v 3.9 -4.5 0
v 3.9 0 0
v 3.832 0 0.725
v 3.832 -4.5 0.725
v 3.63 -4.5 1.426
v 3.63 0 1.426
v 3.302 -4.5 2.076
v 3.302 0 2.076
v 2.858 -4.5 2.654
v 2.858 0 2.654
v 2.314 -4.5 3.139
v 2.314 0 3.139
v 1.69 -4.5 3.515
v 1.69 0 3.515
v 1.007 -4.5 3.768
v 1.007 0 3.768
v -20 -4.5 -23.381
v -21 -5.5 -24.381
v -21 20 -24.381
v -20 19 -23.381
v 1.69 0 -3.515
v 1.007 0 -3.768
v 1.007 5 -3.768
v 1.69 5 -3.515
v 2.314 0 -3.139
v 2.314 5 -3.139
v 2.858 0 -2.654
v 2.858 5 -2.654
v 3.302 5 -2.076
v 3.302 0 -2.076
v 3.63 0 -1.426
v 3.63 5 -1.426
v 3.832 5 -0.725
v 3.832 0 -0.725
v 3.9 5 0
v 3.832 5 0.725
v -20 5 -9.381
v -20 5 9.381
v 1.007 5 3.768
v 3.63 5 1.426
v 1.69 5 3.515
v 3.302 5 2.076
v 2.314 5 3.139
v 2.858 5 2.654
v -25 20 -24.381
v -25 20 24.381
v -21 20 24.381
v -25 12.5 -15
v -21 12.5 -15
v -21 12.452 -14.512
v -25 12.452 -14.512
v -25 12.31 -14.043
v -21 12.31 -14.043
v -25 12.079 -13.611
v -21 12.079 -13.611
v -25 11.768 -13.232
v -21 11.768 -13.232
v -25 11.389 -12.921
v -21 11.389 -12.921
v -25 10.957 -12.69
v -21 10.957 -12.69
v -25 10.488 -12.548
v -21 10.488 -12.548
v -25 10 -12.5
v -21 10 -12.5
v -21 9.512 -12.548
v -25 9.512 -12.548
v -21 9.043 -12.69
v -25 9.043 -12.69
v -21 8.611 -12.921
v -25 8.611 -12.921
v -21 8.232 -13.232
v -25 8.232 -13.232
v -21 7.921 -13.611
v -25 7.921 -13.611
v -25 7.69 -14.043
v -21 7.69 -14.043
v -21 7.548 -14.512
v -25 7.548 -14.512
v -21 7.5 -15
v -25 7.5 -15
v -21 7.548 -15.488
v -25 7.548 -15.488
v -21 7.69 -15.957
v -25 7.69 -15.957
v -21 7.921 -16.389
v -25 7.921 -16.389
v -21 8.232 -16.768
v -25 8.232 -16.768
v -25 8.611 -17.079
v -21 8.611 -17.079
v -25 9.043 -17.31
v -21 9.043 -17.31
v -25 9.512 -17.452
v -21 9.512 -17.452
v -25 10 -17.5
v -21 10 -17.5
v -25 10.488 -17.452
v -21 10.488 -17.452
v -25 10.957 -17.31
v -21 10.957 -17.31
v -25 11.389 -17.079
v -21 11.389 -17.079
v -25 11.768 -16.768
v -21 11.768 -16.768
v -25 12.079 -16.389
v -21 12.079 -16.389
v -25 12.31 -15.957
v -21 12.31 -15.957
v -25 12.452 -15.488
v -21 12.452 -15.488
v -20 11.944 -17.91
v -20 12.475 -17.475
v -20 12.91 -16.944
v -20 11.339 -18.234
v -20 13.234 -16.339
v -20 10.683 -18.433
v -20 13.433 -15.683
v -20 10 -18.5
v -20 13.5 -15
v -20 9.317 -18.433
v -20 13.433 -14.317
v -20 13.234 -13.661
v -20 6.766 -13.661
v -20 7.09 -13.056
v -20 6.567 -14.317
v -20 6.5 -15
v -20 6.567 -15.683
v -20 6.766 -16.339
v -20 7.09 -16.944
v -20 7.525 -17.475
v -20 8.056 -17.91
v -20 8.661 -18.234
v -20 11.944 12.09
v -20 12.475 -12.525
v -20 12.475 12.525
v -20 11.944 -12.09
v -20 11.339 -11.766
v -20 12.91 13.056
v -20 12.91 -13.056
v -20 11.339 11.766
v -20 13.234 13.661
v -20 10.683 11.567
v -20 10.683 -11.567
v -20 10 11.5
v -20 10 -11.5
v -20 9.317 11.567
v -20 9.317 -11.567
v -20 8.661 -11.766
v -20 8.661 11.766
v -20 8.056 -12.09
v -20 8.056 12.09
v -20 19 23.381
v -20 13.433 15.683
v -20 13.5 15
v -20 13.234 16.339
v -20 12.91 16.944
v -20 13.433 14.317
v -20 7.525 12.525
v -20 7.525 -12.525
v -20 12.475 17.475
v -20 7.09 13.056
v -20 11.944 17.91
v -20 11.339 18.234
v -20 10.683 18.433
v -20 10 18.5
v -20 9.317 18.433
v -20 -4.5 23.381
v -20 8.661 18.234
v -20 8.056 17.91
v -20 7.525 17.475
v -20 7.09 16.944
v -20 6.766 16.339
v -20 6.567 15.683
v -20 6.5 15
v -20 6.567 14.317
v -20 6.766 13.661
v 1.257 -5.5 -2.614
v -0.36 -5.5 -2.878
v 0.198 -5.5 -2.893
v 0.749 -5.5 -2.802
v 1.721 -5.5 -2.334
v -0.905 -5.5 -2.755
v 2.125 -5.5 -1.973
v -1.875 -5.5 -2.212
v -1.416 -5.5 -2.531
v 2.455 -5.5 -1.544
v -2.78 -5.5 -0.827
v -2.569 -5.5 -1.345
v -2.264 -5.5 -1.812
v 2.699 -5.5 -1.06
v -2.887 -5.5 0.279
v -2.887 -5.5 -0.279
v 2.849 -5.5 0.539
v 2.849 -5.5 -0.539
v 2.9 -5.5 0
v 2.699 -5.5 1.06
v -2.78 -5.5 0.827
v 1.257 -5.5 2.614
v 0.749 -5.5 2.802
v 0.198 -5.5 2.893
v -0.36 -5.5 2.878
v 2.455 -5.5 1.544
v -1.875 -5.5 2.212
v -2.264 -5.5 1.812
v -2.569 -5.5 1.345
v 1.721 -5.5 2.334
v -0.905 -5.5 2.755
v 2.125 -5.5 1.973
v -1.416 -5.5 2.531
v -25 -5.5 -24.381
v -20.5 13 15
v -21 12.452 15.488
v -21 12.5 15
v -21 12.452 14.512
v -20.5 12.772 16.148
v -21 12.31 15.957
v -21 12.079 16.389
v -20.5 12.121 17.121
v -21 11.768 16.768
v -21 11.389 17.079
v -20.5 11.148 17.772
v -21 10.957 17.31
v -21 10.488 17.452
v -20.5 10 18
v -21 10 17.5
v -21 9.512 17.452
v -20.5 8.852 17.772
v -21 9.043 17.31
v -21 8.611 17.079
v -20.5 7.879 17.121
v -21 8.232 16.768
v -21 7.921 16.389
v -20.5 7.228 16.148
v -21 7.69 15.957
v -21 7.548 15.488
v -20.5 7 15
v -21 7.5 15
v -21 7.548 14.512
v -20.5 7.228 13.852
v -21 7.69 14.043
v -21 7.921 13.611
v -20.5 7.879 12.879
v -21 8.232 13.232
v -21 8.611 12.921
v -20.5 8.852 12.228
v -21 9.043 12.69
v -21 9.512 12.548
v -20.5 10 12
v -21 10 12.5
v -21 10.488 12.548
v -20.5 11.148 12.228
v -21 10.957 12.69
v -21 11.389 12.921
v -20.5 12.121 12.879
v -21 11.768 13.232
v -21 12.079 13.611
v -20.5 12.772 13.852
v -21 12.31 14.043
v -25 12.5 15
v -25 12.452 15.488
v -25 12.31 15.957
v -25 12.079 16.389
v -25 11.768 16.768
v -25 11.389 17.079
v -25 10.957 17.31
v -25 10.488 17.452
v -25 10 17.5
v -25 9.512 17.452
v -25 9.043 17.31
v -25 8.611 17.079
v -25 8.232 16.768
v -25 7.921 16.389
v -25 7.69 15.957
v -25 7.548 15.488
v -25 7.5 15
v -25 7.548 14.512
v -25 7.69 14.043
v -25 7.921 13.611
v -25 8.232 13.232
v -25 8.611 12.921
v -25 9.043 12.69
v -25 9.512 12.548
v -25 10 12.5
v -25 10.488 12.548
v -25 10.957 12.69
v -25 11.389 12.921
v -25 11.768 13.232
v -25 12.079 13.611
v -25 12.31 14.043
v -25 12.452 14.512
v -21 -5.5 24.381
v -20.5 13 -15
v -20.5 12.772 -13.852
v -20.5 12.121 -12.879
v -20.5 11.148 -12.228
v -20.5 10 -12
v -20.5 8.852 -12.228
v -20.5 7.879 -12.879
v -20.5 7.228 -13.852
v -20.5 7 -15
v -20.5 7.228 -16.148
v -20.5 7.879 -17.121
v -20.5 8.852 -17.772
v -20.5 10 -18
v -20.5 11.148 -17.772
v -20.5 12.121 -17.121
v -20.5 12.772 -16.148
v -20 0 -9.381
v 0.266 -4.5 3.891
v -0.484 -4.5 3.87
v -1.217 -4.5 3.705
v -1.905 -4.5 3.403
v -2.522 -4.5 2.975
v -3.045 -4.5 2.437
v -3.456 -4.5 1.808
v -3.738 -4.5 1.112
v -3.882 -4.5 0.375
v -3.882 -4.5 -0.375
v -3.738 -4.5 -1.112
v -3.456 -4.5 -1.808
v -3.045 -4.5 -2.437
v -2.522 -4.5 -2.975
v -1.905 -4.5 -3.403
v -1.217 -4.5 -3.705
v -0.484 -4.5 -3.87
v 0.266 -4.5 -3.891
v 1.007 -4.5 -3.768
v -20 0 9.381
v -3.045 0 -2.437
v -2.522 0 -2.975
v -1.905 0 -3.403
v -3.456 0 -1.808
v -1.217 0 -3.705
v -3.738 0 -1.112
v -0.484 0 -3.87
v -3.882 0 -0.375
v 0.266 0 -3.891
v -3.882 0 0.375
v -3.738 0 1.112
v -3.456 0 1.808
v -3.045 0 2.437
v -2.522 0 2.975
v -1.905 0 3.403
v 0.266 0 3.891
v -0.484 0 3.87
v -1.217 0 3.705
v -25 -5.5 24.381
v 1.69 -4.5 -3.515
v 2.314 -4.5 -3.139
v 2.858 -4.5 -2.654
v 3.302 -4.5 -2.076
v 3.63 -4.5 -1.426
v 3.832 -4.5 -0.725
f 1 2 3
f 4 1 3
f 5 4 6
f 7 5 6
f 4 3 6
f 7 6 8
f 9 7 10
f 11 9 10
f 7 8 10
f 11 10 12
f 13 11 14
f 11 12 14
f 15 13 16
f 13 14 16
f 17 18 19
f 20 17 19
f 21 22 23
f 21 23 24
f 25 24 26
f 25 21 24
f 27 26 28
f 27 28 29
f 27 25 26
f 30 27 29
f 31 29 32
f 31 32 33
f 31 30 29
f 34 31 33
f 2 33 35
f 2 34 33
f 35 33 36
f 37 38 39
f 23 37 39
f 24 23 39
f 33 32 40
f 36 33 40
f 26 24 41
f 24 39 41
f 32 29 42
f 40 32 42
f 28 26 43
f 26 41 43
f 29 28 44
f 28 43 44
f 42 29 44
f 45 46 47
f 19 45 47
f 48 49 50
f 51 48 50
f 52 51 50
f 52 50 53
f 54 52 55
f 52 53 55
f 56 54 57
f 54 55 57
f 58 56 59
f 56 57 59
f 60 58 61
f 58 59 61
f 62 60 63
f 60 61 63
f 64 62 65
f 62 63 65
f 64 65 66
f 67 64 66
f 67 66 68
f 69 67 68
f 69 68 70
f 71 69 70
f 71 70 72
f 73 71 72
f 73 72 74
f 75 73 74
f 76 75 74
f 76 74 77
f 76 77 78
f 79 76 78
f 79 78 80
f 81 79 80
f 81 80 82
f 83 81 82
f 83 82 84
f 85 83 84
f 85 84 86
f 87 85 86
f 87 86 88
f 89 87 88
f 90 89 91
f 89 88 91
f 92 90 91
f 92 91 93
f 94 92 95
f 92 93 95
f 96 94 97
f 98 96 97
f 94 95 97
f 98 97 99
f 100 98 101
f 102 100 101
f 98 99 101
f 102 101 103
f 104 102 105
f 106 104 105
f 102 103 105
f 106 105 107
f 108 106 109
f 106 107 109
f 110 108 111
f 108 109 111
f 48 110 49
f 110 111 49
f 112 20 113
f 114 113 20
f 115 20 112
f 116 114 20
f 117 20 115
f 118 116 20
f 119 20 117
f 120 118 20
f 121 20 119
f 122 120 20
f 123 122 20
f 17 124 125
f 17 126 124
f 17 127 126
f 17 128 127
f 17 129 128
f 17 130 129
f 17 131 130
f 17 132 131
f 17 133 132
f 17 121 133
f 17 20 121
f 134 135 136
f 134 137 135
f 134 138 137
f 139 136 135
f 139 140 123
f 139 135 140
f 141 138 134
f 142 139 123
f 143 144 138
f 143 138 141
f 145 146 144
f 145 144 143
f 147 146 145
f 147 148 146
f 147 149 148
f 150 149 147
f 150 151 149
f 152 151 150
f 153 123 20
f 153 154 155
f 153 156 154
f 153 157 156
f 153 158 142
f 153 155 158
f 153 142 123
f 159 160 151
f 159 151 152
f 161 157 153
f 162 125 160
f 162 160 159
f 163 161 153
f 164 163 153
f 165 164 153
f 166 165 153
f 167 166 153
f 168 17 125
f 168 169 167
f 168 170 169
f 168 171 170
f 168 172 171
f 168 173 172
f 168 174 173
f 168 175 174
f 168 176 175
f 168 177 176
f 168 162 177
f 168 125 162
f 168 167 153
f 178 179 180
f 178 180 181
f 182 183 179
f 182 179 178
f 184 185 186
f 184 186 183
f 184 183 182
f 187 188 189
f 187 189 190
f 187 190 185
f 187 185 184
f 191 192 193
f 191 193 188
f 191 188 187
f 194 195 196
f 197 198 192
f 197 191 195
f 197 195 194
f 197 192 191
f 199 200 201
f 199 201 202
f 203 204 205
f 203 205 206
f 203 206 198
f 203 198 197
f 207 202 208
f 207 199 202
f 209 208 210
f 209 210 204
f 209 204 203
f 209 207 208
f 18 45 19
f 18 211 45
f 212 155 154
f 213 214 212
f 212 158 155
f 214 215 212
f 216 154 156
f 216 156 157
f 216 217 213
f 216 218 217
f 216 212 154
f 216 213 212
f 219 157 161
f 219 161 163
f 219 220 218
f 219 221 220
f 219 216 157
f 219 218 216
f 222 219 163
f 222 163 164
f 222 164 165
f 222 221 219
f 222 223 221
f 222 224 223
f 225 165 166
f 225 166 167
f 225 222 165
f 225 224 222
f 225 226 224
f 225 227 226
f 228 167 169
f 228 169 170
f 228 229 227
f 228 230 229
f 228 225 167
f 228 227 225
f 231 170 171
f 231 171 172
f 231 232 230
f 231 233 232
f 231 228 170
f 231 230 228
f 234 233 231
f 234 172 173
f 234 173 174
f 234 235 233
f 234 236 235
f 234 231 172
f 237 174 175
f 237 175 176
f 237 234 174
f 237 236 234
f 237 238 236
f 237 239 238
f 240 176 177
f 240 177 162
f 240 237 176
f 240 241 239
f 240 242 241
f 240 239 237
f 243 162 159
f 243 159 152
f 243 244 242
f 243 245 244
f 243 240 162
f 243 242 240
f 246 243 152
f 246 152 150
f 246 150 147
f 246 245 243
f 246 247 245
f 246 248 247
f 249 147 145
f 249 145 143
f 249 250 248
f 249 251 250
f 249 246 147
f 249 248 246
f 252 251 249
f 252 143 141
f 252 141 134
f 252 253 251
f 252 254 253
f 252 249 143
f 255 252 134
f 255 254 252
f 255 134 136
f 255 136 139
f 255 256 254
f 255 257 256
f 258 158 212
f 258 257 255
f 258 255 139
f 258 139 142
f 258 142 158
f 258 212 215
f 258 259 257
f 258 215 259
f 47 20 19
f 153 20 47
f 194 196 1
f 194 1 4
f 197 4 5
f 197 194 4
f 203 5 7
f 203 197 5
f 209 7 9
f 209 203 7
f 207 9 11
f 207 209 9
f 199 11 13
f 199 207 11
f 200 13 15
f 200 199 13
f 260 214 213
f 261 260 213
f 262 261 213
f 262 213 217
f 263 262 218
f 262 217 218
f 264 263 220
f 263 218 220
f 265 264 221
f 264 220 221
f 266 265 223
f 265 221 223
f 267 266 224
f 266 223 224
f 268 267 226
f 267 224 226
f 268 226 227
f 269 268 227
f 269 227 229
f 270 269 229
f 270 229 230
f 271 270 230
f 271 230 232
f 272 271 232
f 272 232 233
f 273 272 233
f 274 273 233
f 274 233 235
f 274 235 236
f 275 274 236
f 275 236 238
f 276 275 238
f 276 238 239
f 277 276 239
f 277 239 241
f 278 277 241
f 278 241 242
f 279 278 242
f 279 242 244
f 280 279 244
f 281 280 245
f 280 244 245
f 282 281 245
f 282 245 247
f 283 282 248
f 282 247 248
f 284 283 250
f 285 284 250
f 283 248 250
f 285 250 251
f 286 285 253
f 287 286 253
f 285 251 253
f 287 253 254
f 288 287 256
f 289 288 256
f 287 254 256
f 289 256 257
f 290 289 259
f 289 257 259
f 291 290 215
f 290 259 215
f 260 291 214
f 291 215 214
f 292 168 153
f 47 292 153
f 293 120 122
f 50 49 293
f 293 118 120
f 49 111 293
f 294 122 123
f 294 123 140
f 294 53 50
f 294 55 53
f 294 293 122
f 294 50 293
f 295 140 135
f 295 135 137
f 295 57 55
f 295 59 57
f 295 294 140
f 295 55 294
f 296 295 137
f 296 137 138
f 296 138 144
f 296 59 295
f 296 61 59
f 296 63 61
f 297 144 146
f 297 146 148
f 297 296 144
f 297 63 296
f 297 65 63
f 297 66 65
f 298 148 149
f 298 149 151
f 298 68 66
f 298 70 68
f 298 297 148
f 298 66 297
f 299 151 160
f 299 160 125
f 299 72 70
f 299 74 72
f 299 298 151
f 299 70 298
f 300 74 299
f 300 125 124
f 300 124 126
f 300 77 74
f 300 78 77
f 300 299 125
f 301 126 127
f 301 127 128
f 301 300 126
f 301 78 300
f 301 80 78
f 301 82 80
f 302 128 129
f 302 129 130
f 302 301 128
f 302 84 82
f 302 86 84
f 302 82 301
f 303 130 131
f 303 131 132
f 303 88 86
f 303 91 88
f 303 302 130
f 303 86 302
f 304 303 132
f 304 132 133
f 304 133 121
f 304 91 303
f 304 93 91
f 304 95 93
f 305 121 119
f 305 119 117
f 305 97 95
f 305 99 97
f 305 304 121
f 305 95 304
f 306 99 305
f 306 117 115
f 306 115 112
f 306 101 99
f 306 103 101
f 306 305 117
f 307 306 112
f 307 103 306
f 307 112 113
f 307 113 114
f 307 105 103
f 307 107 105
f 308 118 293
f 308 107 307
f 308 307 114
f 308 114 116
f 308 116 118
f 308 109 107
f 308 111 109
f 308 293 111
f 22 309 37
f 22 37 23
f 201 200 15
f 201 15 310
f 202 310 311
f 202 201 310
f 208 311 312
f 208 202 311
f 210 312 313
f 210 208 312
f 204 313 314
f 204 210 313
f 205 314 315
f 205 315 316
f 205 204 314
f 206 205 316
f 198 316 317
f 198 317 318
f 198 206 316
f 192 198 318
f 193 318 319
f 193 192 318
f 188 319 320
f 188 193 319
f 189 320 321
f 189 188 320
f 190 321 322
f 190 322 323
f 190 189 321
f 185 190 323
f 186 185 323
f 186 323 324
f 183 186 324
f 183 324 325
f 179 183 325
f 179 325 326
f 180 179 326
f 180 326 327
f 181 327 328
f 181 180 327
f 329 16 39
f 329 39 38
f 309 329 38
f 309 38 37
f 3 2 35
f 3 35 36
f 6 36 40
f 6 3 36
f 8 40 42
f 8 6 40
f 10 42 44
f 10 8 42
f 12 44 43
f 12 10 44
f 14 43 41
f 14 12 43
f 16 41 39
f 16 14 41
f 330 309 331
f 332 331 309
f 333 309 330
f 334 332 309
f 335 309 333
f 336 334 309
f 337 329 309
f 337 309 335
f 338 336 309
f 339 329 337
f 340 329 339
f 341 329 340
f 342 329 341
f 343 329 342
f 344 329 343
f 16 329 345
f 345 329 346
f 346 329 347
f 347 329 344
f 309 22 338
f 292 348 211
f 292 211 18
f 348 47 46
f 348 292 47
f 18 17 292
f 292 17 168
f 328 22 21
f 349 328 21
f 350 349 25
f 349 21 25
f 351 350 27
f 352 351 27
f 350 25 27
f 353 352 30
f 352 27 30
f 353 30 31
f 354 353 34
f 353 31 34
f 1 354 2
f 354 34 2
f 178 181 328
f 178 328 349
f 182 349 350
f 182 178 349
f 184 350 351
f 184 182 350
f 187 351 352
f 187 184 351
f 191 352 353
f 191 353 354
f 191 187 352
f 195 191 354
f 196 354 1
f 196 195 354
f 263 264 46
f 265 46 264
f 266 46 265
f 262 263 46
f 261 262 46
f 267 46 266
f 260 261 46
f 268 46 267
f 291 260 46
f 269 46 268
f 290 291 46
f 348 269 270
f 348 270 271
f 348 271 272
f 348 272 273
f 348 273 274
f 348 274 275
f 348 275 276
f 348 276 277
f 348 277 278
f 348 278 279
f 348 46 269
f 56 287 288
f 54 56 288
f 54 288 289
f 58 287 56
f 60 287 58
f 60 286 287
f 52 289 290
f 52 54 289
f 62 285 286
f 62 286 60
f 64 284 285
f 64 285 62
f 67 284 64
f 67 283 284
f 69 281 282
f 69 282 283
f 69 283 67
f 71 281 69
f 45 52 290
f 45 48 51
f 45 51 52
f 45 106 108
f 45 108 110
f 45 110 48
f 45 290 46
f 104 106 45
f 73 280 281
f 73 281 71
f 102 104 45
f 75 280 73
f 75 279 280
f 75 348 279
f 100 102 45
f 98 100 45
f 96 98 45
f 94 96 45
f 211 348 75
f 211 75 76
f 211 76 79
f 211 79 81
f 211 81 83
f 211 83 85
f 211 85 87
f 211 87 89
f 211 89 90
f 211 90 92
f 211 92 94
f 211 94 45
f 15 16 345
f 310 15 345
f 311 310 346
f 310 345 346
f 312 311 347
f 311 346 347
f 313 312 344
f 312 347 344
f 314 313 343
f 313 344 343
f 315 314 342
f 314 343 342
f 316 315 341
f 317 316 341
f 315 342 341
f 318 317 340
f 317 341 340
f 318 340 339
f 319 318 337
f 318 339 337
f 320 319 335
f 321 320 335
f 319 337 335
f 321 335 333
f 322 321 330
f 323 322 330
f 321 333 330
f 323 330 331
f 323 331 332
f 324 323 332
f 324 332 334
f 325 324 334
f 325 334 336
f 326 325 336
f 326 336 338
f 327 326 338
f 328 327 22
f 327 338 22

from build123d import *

# Parameters (mm, degrees)
F1_DEPTH  = 5.5
F2_DEPTH  = 5
F3_DEPTH  = 20
F4_R      = 2.5
F5_DEPTH  = 10
F6_SIZE   = 1
F6_2_SIZE = 1


with BuildPart() as f1:
    # F0 (on Front) → F1 (new body)
    with BuildSketch(Plane.XZ):
        with BuildLine():
            ThreePointArc((1.0068716538, -3.767785752), (3.0932830011, -2.3752053122), (3.9, 0))
            ThreePointArc((3.9, 0), (3.0932830011, 2.3752053122), (1.0068716538, 3.767785752))
            ThreePointArc((1.0068716538, 3.767785752), (-3.9, 0), (1.0068716538, -3.767785752))
        make_face()
    extrude(amount=F1_DEPTH)

    # F0 (on Front) → F2 (join)
    with BuildSketch(Plane.XZ):
        with BuildLine():
            ThreePointArc((1.0068716538, -3.767785752), (-3.9, 0), (1.0068716538, 3.767785752))
            Line((1.0068716538, 3.767785752), (-20, 9.3814870065))
            Line((-20, 9.3814870065), (-20, 0))
            Line((-20, 0), (-20, -9.3814870065))
            Line((-20, -9.3814870065), (1.0068716538, -3.767785752))
        make_face()
        with BuildLine():
            ThreePointArc((1.0068716538, -3.767785752), (3.0932830011, -2.3752053122), (3.9, 0))
            ThreePointArc((3.9, 0), (3.0932830011, 2.3752053122), (1.0068716538, 3.767785752))
            ThreePointArc((1.0068716538, 3.767785752), (-3.9, 0), (1.0068716538, -3.767785752))
        make_face()
    extrude(amount=-F2_DEPTH)

    # F6
    f6_edges = [f1.edges().sort_by_distance(p)[0] for p in [
        (-1.006872, -5.5, 3.767786),
    ]]
    chamfer(f6_edges, length=F6_SIZE)


with BuildPart() as f1b:
    # F0 (on Front) → F1, piece 2 (new body)
    with BuildSketch(Plane.XZ):
        Polygon((-20, 0), (-20, 9.3814870065), (-20, 24.3814870065), (-25, 24.3814870065), (-25, 0.7844285667), (-25, -9.3814870065), (-25, -24.3814870065), (-20, -24.3814870065), (-20, -9.3814870065), align=None)
    extrude(amount=F1_DEPTH)

    # F0 (on Front) → F3 (join)
    with BuildSketch(Plane.XZ):
        Polygon((-20, 0), (-20, 9.3814870065), (-20, 24.3814870065), (-25, 24.3814870065), (-25, 0.7844285667), (-25, -9.3814870065), (-25, -24.3814870065), (-20, -24.3814870065), (-20, -9.3814870065), align=None)
    extrude(amount=-F3_DEPTH)

    # F4 (on face) → F5 (cut)
    with BuildSketch(Plane.YZ.offset(-20)):
        with Locations((10, 15)):
            Circle(F4_R)
        with Locations((10, -15)):
            Circle(F4_R)
    extrude(amount=-F5_DEPTH, mode=Mode.SUBTRACT)

    # F6#2
    f6_2_edges = [f1b.edges().sort_by_distance(p)[0] for p in [
        (-20, 7.5, 15),
        (-20, 7.5, -15),
        (-20, 20, 0),
        (-20, 7.25, 24.381487),
        (-20, -5.5, 0),
        (-20, 7.25, -24.381487),
    ]]
    chamfer(f6_2_edges, length=F6_2_SIZE)


solid = Compound([f1.part, f1b.part])
